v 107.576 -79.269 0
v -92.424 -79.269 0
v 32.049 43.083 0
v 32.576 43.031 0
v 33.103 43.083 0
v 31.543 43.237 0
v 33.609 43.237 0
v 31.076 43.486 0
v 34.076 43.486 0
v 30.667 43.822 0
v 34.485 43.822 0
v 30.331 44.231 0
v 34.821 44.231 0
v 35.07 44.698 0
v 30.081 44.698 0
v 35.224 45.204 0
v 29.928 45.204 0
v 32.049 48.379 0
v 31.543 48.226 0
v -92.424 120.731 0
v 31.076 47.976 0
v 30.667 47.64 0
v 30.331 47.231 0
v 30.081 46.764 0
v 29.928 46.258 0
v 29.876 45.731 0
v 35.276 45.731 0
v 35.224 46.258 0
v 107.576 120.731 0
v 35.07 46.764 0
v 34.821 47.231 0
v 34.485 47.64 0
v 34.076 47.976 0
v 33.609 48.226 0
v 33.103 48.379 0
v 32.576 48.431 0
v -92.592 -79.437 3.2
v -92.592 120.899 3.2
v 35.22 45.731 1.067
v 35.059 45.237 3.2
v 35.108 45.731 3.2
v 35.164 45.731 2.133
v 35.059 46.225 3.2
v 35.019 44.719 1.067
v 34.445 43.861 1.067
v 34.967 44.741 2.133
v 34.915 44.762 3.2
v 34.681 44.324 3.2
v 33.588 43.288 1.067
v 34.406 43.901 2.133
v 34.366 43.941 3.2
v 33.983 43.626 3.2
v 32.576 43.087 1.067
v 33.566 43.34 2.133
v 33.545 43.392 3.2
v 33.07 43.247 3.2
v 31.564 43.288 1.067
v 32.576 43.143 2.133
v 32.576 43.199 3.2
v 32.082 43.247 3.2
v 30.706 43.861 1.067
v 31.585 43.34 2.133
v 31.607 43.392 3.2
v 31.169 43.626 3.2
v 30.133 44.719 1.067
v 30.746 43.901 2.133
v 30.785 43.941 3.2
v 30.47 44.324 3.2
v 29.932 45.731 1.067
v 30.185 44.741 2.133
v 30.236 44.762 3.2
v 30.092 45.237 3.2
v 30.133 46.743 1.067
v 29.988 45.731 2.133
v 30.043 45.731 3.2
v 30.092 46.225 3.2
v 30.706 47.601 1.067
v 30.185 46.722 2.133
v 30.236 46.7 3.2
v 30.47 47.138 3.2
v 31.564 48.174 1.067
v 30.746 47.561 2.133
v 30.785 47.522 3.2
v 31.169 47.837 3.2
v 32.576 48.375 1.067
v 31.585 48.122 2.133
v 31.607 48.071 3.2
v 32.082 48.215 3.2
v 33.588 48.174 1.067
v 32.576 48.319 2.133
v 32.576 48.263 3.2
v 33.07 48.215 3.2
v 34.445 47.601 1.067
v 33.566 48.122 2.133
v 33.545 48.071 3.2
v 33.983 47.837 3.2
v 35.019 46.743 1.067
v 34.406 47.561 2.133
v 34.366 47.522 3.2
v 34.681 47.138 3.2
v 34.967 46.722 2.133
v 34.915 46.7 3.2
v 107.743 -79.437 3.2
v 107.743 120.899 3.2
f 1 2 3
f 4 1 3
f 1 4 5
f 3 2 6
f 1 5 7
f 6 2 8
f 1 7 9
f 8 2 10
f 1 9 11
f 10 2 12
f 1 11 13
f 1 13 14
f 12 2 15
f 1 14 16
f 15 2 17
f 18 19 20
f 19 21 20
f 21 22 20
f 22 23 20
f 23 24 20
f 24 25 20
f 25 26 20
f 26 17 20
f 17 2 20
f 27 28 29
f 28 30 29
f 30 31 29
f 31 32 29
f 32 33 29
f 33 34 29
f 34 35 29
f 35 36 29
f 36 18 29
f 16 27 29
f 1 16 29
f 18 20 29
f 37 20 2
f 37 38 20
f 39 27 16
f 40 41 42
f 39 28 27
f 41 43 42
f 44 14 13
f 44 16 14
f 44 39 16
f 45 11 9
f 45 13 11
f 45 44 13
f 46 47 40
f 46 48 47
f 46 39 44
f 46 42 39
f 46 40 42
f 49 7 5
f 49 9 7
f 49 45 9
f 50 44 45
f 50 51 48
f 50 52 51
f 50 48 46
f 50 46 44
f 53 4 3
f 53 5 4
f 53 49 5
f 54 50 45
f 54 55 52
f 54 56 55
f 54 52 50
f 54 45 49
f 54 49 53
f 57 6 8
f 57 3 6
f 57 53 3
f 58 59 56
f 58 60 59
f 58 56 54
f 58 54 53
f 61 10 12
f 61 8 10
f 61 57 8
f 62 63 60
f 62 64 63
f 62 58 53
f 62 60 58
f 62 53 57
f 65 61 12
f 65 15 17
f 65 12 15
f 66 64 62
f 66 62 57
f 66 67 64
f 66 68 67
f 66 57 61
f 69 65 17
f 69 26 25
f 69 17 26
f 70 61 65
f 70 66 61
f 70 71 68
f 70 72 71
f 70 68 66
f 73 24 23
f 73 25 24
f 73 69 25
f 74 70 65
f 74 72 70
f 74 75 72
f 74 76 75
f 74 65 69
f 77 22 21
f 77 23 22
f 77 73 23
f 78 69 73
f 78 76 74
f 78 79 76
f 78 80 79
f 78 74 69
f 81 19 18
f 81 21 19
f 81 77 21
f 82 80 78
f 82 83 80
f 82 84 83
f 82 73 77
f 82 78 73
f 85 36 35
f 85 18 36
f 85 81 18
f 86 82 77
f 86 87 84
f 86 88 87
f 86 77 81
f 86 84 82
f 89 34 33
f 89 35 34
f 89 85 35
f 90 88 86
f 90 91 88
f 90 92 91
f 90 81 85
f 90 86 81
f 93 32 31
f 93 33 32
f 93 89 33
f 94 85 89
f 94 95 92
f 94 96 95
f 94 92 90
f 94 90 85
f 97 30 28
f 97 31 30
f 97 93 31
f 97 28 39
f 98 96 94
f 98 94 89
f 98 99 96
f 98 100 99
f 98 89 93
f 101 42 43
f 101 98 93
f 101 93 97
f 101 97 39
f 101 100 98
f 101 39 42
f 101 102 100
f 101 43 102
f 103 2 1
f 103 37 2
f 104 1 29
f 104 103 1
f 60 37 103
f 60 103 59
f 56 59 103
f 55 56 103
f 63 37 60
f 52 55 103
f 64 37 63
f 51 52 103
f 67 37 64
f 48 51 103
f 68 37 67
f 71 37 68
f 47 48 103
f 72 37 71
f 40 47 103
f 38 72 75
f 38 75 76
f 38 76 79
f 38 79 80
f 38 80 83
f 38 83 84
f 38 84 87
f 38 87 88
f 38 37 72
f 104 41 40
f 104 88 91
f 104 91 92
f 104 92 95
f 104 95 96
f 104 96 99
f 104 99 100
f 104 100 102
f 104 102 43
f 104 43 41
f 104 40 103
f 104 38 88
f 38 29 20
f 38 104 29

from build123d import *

# Parameters (mm, degrees)
F0_W     = 200
F0_H     = 200
F0_R     = 2.7
F1_DEPTH = 3.2
F1_TAPER = -3


with BuildPart() as f1:
    # F0 (on Top) → F1 (new body)
    with BuildSketch(Plane.XY):
        with Locations((7.575776428, 20.7311080147)):
            Rectangle(F0_W, F0_H)
        with Locations((32.575776428, 45.7311080147)):
            Circle(F0_R, mode=Mode.SUBTRACT)
    extrude(amount=F1_DEPTH, taper=F1_TAPER)


solid = f1.part
